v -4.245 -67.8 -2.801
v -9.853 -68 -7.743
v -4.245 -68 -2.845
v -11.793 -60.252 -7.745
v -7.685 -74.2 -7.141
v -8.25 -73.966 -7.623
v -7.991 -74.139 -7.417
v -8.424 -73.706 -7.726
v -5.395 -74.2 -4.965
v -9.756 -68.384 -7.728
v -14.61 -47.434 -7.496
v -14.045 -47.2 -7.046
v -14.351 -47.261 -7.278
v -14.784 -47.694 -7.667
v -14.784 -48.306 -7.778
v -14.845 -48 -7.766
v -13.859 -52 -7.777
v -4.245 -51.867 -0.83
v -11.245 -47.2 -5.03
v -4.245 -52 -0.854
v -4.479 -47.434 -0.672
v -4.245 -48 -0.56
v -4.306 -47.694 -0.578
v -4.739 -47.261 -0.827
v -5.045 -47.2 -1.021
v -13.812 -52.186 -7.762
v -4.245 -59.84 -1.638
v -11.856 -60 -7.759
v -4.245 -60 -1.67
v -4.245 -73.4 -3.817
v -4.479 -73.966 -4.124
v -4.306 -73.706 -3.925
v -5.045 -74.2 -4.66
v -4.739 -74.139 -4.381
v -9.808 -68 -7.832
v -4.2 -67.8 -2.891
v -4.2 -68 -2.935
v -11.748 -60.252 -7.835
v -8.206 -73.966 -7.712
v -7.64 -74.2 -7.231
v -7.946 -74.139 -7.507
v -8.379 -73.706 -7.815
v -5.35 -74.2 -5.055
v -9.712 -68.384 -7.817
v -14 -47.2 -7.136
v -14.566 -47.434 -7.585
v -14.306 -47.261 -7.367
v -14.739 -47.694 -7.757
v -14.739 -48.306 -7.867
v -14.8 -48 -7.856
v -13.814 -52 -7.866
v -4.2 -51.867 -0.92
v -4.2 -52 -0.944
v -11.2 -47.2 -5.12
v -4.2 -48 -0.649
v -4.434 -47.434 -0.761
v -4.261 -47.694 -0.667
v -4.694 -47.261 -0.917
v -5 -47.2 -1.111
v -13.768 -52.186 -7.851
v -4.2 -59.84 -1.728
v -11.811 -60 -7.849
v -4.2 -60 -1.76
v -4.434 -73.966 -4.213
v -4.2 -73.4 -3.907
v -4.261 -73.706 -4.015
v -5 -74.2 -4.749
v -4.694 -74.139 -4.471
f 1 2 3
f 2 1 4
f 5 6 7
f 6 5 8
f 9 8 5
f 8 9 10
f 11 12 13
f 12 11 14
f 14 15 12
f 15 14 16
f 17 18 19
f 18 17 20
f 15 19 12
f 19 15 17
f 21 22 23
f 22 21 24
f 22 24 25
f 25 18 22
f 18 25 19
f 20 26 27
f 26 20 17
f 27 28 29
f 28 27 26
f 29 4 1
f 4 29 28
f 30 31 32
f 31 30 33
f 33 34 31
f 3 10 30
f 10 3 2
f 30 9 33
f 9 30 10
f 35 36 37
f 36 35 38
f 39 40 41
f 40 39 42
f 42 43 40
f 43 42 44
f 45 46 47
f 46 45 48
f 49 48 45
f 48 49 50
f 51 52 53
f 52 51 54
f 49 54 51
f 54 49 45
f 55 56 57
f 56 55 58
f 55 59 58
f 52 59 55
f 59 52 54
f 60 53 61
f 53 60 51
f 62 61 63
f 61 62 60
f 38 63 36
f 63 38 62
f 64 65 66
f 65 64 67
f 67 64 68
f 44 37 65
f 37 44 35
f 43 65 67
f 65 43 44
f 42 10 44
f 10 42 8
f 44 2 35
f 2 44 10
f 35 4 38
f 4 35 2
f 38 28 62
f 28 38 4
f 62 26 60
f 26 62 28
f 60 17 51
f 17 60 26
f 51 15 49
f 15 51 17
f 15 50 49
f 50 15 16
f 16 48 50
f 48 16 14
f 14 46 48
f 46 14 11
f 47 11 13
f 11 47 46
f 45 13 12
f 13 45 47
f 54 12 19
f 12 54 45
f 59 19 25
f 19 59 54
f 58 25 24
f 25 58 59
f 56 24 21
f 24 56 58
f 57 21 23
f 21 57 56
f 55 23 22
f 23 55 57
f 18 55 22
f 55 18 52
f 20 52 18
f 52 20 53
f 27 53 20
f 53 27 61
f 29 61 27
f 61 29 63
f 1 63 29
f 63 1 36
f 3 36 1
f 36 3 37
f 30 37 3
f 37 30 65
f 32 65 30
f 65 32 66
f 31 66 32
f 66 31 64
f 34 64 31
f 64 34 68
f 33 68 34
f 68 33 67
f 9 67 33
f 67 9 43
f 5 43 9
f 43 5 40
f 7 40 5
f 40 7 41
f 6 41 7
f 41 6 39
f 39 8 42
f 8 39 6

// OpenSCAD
use <../lib.scad>
use <4221407dc01.scad>
function ldraw_lib__4221407ec01() = [
// 0 Sticker  1.5 x  3.3 Trapezoid Yellow Right (Formed)
// 0 Name: 4221407ec01.dat
// 0 Author: Evert-Jan Boer [ejboer]
// 0 !LDRAW_ORG Part UPDATE 2024-08
// 0 !LICENSE Licensed under CC BY 4.0 : see CAreadme.txt
// 
// 0 BFC CERTIFY CCW
  [0,"BFC","CERTIFY"],
  [0,"BFC","CCW"],
// 
// 0 !KEYWORDS Set 10134, Star Wars, Y-Wing Starfighter
// 
// 0 !HISTORY 2024-09-30 [OrionP] Official Update 2024-08
// 
// 
// 1 16 0 0 0 -1 0 0 0 1 0 0 0 1 4221407dc01.dat
  [1,16,0,0,0,-1,0,0,0,1,0,0,0,1, ldraw_lib__4221407dc01()],
];
module ldraw_lib__4221407ec01(step=0, col=false, unit=2/5, alt=false, line=0.2, solid=!$preview)
    makepoly(ldraw_lib__4221407ec01(), step=step, col=col, unit=unit, alt=alt, line=line, solid=solid);
ldraw_lib__4221407ec01(line=0.2);
